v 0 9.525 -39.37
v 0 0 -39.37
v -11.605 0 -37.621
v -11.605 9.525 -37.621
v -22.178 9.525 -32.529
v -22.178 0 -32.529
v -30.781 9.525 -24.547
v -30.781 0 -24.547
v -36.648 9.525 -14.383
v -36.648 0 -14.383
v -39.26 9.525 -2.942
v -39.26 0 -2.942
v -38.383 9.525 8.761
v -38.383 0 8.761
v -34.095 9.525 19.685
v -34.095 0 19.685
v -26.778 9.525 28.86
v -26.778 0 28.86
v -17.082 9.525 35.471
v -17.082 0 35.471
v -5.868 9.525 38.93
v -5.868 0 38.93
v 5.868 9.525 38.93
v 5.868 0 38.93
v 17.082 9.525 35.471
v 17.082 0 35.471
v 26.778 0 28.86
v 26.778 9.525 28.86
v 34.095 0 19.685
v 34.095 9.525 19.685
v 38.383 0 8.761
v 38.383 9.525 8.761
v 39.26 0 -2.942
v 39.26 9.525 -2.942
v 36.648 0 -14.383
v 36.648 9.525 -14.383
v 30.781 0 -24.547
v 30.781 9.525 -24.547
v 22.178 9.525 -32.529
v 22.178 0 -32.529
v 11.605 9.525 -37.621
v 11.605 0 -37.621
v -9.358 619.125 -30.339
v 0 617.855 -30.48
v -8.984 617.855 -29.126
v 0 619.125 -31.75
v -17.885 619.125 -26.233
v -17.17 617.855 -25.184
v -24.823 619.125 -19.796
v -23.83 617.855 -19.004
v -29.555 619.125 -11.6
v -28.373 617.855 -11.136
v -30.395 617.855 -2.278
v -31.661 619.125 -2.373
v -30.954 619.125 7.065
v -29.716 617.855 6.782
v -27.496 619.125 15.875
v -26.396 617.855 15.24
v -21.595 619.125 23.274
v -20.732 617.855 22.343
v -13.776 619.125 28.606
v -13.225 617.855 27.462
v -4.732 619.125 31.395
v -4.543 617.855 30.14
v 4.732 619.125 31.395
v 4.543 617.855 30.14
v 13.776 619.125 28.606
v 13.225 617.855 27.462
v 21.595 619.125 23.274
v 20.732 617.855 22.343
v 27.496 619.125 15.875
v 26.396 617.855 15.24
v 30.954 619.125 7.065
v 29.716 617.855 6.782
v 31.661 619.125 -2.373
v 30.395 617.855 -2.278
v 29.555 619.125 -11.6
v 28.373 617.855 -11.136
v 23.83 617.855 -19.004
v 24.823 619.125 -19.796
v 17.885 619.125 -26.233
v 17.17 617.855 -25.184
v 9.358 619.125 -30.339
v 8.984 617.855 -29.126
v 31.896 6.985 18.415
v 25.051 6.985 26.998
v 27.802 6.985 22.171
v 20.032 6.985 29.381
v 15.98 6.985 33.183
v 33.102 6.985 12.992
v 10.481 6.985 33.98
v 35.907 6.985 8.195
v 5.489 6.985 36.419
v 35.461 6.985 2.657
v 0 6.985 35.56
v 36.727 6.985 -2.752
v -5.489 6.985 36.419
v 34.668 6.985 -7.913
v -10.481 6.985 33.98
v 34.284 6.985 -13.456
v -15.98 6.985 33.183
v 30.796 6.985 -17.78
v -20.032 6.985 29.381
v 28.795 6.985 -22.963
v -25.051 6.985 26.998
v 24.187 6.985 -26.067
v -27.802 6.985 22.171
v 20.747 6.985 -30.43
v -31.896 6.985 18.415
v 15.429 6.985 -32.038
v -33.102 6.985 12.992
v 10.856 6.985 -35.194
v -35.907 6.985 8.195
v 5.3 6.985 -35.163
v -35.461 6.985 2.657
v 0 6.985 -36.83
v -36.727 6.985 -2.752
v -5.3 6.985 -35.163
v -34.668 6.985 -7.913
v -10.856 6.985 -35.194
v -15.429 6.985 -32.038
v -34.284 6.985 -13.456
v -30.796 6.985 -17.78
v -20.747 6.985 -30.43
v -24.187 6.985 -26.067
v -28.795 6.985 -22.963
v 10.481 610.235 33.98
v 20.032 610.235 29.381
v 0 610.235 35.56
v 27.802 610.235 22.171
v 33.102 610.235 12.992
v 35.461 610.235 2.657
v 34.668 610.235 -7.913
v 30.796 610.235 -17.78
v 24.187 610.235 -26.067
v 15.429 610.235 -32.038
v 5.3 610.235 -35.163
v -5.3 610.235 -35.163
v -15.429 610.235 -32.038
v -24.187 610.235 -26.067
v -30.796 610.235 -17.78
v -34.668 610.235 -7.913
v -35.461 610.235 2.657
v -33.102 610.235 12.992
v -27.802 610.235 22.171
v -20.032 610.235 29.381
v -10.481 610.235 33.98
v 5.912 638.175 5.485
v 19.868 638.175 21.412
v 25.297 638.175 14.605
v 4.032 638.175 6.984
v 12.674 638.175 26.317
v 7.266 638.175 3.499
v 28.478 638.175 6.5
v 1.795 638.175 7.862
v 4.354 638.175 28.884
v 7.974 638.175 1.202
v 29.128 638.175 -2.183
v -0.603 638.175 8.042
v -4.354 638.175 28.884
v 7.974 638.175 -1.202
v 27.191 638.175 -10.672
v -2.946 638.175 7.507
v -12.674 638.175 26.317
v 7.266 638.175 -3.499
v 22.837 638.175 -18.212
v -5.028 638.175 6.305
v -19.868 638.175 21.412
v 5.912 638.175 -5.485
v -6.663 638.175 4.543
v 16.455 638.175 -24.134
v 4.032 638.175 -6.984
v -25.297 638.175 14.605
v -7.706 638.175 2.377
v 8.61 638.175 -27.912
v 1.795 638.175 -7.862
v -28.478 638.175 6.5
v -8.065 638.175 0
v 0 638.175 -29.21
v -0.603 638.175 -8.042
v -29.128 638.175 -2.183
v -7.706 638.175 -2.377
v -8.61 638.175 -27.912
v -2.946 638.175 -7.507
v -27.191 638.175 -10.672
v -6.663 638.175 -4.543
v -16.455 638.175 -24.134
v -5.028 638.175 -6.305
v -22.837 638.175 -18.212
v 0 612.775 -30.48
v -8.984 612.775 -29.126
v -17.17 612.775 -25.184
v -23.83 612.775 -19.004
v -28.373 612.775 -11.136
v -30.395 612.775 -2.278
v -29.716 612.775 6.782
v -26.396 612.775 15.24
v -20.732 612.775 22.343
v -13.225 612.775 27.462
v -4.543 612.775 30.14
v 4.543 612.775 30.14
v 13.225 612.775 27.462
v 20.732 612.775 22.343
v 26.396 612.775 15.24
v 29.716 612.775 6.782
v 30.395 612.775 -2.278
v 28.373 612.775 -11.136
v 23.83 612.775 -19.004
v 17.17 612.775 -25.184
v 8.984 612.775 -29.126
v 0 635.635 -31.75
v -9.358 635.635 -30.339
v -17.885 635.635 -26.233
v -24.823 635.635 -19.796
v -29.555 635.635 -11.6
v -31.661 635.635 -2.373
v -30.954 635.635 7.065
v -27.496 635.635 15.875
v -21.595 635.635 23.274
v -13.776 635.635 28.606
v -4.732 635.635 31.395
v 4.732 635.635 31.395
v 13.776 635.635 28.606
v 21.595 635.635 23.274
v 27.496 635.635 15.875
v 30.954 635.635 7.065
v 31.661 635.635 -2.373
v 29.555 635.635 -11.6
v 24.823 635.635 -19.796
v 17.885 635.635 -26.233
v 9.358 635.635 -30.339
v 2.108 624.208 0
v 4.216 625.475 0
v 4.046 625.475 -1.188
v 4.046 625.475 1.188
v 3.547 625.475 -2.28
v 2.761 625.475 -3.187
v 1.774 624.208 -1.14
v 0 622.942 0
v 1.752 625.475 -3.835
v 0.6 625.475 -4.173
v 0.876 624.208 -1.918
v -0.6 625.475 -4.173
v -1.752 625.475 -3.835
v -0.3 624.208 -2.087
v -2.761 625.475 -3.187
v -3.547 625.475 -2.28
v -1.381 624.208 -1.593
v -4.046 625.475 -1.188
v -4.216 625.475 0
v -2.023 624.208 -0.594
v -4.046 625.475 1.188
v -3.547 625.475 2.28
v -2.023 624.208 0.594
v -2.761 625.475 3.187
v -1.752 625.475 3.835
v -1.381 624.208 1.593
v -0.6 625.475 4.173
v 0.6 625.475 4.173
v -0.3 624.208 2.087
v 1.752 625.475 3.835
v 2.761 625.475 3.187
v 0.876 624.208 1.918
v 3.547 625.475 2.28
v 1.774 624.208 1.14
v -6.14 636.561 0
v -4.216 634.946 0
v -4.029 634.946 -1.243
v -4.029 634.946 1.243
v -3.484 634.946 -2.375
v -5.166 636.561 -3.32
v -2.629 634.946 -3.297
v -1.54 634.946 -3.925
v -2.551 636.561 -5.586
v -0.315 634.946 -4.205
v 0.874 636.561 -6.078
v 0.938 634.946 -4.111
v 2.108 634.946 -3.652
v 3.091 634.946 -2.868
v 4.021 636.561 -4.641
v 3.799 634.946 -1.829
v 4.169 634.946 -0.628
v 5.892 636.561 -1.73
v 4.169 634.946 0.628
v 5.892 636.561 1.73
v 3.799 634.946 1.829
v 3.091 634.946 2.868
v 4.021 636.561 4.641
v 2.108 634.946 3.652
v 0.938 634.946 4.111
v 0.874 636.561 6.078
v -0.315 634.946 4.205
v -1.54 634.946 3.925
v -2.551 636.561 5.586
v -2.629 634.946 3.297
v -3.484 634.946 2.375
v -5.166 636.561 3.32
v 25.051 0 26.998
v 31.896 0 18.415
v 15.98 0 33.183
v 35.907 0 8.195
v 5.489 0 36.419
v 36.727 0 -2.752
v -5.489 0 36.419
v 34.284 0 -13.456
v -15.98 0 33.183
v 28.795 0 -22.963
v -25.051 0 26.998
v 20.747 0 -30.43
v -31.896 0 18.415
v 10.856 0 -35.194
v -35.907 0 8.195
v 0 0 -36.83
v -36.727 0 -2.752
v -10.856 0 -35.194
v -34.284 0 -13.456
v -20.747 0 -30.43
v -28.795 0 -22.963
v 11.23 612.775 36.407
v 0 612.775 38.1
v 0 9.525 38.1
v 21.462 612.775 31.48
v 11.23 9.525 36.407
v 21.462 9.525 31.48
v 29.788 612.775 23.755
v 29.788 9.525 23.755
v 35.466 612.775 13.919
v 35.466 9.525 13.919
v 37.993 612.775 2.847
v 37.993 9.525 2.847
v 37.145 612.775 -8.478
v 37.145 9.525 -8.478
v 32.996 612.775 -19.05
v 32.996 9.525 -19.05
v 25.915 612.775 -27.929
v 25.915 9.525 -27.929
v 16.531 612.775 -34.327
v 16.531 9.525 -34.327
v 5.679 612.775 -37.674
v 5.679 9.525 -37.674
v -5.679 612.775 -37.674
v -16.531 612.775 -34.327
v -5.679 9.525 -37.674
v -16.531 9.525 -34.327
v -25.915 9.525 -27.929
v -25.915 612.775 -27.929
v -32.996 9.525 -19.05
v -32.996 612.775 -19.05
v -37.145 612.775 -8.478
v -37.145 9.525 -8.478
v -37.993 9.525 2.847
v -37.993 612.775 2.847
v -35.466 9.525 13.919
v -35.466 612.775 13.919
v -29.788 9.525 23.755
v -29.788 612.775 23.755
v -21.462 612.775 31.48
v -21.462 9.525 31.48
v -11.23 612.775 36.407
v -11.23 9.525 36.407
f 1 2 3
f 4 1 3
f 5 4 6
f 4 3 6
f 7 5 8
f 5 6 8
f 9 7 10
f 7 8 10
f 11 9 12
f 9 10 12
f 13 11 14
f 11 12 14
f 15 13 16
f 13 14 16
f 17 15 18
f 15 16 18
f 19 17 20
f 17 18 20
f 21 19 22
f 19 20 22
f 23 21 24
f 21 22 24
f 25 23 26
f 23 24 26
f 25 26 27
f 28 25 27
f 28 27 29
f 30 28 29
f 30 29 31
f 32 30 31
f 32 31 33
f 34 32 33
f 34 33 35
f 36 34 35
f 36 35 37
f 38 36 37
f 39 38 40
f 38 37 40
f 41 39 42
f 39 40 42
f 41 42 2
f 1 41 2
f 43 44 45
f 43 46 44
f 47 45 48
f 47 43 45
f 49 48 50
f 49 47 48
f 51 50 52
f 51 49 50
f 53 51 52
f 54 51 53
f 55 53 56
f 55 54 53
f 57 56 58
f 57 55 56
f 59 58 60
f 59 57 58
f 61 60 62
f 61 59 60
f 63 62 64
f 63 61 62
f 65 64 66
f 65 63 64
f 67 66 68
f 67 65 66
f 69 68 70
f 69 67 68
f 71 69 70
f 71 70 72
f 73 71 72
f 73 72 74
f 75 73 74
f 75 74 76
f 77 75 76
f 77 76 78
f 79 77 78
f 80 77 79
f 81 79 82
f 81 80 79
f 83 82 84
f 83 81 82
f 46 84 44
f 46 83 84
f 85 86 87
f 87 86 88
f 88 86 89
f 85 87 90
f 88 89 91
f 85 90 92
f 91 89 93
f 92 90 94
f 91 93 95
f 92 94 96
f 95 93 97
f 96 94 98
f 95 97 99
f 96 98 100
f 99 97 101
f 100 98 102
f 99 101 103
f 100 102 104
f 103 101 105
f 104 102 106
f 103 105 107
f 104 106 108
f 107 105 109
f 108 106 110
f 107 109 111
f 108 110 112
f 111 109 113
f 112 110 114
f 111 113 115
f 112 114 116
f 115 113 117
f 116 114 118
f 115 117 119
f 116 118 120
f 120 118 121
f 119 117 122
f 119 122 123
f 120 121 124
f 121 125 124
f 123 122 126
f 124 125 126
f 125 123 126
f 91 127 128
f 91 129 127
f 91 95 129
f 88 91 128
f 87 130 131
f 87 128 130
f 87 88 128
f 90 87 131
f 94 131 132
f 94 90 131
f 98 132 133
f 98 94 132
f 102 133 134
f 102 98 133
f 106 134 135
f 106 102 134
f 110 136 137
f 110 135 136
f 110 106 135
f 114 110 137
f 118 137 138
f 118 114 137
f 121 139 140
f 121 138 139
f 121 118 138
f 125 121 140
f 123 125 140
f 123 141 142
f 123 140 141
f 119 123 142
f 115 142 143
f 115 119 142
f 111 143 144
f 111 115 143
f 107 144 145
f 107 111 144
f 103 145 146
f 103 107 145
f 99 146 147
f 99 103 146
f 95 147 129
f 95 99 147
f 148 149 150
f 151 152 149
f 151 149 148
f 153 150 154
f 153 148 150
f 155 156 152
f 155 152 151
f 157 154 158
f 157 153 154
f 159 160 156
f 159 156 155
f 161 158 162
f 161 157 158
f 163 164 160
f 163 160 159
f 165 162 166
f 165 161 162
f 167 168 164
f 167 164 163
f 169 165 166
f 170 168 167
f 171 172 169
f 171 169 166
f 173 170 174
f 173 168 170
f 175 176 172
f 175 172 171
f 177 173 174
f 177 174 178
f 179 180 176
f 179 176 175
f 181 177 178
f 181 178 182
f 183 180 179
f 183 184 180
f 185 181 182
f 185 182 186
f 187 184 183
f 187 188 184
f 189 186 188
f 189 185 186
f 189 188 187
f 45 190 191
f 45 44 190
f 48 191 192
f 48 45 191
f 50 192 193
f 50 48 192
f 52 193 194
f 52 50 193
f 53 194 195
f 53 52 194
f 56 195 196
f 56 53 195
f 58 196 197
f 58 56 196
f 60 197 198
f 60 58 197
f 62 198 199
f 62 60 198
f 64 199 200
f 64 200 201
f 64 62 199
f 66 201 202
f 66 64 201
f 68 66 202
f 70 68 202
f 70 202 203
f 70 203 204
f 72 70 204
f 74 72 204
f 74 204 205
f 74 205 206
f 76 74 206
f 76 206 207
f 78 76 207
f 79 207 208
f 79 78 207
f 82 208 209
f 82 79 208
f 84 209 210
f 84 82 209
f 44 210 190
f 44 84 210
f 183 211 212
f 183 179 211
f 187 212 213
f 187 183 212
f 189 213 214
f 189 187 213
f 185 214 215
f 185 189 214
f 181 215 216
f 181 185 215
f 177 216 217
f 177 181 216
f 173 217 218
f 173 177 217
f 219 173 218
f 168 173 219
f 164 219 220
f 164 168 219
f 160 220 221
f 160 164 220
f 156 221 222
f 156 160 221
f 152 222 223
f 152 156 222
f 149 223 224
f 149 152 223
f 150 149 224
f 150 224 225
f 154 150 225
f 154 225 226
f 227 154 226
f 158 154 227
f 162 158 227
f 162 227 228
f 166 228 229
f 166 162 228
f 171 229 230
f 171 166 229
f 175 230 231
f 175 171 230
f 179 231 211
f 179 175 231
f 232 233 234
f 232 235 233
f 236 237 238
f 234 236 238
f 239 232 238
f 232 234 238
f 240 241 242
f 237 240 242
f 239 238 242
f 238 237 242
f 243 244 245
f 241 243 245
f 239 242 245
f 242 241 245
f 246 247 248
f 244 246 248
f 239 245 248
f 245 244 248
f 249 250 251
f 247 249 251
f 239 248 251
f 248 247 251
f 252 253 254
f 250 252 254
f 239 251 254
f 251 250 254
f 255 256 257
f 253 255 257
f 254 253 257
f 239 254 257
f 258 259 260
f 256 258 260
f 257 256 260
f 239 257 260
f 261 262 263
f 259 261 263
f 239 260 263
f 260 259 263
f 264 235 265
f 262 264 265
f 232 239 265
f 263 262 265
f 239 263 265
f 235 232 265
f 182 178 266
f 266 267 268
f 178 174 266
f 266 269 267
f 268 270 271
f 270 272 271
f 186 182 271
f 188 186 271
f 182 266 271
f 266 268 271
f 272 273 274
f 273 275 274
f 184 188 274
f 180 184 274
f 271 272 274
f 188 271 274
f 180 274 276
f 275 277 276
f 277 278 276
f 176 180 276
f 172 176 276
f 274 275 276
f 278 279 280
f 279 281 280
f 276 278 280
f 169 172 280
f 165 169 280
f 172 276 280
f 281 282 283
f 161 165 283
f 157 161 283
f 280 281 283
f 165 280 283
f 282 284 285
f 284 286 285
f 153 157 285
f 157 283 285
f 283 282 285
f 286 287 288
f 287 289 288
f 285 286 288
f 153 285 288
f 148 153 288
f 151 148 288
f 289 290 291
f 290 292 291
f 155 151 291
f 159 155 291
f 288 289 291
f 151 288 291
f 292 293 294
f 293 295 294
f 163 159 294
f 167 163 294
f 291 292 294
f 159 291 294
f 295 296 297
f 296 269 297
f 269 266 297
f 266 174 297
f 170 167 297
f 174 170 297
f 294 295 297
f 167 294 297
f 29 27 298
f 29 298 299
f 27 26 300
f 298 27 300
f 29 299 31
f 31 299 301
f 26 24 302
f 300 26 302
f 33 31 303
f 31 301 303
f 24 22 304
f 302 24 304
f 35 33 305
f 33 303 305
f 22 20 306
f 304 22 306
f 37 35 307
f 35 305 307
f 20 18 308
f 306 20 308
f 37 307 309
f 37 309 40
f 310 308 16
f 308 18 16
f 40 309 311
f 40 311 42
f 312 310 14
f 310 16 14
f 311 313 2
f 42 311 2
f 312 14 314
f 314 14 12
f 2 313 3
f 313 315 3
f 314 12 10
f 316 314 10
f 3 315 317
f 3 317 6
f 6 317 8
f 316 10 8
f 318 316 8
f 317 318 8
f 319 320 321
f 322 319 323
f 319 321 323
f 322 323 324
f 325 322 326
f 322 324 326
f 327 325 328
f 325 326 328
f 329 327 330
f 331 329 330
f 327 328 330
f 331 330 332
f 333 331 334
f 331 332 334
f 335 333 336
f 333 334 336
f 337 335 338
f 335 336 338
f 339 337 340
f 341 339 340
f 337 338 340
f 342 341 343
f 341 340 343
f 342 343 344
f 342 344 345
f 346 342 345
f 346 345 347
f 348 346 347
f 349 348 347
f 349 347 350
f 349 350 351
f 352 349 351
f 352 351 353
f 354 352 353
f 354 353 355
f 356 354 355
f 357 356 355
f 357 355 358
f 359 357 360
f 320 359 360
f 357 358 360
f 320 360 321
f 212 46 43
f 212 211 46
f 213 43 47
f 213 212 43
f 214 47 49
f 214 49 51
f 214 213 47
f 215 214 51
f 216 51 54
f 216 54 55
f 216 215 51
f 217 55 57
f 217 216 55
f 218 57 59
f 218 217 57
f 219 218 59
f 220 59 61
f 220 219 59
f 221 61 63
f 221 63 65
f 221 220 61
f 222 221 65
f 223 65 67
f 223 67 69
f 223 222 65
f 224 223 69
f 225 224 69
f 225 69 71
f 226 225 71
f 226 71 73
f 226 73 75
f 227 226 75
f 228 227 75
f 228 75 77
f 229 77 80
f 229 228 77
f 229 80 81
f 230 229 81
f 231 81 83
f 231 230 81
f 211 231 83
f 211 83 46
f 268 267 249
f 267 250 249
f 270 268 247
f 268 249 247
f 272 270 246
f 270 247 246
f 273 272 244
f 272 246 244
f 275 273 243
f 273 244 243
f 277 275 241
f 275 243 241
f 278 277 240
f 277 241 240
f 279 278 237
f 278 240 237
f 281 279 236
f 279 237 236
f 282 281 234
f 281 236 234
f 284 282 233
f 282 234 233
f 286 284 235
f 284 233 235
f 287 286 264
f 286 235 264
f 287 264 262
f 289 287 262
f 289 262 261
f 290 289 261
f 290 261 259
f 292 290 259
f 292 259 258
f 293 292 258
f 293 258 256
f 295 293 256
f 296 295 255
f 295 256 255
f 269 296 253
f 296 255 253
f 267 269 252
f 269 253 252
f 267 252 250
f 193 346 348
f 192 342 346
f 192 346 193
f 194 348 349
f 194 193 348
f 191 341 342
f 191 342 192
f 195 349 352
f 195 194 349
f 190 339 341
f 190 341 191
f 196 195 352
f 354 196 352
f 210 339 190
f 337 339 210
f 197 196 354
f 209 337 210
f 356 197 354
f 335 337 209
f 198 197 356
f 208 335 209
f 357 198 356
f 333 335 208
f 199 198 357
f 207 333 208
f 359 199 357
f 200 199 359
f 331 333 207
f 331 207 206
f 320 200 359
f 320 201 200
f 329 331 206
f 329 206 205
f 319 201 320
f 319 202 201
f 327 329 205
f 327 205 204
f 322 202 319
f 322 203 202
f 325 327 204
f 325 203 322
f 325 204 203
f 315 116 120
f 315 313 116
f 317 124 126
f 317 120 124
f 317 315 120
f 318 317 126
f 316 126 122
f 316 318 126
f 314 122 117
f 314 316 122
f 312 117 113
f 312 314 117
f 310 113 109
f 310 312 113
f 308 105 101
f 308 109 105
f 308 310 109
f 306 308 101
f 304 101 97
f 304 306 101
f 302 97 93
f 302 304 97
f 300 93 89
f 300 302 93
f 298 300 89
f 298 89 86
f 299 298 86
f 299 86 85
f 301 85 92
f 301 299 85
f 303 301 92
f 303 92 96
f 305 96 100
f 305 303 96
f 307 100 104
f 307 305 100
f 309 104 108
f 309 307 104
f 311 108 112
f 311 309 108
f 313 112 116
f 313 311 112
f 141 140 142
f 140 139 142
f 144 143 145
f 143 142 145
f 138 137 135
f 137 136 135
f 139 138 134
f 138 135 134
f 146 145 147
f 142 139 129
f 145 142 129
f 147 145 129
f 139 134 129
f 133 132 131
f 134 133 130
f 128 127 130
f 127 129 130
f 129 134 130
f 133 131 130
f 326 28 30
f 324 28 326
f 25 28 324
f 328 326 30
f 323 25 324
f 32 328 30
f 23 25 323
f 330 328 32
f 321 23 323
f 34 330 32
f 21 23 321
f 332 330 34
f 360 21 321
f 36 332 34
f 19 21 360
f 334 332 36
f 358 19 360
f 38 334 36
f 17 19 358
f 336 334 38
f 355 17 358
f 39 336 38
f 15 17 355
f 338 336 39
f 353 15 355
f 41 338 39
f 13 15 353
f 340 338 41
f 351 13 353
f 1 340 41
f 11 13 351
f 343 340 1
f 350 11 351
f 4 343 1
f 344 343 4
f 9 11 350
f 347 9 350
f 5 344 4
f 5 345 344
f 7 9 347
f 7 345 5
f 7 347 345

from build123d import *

# Parameters (mm, degrees)
SKETCH1_R                                           = 39.37
BOSS_EXTRUDE1_DEPTH                                 = 9.525
SKETCH2_R                                           = 38.1
BOSS_EXTRUDE2_DEPTH                                 = 603.25
SHELL1_T                                            = -2.54
CSK_FOR_5_16_FLAT_HEAD_MACHINE_SCREW_10_D           = 8.4328
CSK_FOR_5_16_FLAT_HEAD_MACHINE_SCREW_10_DEPTH       = 12.7
CSK_FOR_5_16_FLAT_HEAD_MACHINE_SCREW_10_CSINK_D     = 16.129
CSK_FOR_5_16_FLAT_HEAD_MACHINE_SCREW_10_CSINK_ANGLE = 100
CSK_FOR_5_16_FLAT_HEAD_MACHINE_SCREW_10_TIP         = 2.533468714


with BuildPart() as part:
    # Sketch1 → Boss-Extrude1 (new body)
    with BuildSketch(Plane(origin=(0, 0, 0), x_dir=(1, 0, 0), z_dir=(0, 1, 0))):
        with Locations(Location((0, 0, 0), (0, 0, 90))):
            Circle(SKETCH1_R)
    extrude(amount=BOSS_EXTRUDE1_DEPTH)

    # Sketch2 → Boss-Extrude2 (add)
    with BuildSketch(Plane(origin=(0, 9.525, 0), x_dir=(1, 0, 0), z_dir=(0, 1, 0))):
        with Locations(Location((0, 0, 0), (0, 0, 270))):
            Circle(SKETCH2_R)
    extrude(amount=BOSS_EXTRUDE2_DEPTH)

    # Shell1
    shell1_openings = [part.faces().sort_by_distance(p)[0] for p in [
        (0, 0, 0),
    ]]
    offset(amount=SHELL1_T, openings=shell1_openings, kind=Kind.INTERSECTION)

    # Sketch4 → Revolve1 (revolve)
    with BuildSketch(Plane.XY, mode=Mode.PRIVATE) as revolve1_sk:
        Polygon((0, 612.775), (30.48, 612.775), (30.48, 617.855), (31.75, 619.125), (31.75, 635.635), (29.21, 638.175), (0, 638.175), align=None)
    revolve(revolve1_sk.sketch.rotate(Axis((0, 0, 0), (0, 1, 0)), 90), axis=Axis((0, 0, 0), (0, 1, 0)))

    # CSK for 5/16 Flat Head Machine Screw (100)1
    with Locations(Plane(origin=(0, 638.175, 0), x_dir=(1, 0, 0), z_dir=(0, 1, 0))):
        with Locations((0, 0)):
            CounterSinkHole(CSK_FOR_5_16_FLAT_HEAD_MACHINE_SCREW_10_D / 2, CSK_FOR_5_16_FLAT_HEAD_MACHINE_SCREW_10_CSINK_D / 2, depth=CSK_FOR_5_16_FLAT_HEAD_MACHINE_SCREW_10_DEPTH, counter_sink_angle=CSK_FOR_5_16_FLAT_HEAD_MACHINE_SCREW_10_CSINK_ANGLE)
            with Locations((0, 0, -(CSK_FOR_5_16_FLAT_HEAD_MACHINE_SCREW_10_DEPTH + CSK_FOR_5_16_FLAT_HEAD_MACHINE_SCREW_10_TIP / 2))):  # 118° drill point
                Cone(0, CSK_FOR_5_16_FLAT_HEAD_MACHINE_SCREW_10_D / 2, CSK_FOR_5_16_FLAT_HEAD_MACHINE_SCREW_10_TIP, mode=Mode.SUBTRACT)


solid = part.part
